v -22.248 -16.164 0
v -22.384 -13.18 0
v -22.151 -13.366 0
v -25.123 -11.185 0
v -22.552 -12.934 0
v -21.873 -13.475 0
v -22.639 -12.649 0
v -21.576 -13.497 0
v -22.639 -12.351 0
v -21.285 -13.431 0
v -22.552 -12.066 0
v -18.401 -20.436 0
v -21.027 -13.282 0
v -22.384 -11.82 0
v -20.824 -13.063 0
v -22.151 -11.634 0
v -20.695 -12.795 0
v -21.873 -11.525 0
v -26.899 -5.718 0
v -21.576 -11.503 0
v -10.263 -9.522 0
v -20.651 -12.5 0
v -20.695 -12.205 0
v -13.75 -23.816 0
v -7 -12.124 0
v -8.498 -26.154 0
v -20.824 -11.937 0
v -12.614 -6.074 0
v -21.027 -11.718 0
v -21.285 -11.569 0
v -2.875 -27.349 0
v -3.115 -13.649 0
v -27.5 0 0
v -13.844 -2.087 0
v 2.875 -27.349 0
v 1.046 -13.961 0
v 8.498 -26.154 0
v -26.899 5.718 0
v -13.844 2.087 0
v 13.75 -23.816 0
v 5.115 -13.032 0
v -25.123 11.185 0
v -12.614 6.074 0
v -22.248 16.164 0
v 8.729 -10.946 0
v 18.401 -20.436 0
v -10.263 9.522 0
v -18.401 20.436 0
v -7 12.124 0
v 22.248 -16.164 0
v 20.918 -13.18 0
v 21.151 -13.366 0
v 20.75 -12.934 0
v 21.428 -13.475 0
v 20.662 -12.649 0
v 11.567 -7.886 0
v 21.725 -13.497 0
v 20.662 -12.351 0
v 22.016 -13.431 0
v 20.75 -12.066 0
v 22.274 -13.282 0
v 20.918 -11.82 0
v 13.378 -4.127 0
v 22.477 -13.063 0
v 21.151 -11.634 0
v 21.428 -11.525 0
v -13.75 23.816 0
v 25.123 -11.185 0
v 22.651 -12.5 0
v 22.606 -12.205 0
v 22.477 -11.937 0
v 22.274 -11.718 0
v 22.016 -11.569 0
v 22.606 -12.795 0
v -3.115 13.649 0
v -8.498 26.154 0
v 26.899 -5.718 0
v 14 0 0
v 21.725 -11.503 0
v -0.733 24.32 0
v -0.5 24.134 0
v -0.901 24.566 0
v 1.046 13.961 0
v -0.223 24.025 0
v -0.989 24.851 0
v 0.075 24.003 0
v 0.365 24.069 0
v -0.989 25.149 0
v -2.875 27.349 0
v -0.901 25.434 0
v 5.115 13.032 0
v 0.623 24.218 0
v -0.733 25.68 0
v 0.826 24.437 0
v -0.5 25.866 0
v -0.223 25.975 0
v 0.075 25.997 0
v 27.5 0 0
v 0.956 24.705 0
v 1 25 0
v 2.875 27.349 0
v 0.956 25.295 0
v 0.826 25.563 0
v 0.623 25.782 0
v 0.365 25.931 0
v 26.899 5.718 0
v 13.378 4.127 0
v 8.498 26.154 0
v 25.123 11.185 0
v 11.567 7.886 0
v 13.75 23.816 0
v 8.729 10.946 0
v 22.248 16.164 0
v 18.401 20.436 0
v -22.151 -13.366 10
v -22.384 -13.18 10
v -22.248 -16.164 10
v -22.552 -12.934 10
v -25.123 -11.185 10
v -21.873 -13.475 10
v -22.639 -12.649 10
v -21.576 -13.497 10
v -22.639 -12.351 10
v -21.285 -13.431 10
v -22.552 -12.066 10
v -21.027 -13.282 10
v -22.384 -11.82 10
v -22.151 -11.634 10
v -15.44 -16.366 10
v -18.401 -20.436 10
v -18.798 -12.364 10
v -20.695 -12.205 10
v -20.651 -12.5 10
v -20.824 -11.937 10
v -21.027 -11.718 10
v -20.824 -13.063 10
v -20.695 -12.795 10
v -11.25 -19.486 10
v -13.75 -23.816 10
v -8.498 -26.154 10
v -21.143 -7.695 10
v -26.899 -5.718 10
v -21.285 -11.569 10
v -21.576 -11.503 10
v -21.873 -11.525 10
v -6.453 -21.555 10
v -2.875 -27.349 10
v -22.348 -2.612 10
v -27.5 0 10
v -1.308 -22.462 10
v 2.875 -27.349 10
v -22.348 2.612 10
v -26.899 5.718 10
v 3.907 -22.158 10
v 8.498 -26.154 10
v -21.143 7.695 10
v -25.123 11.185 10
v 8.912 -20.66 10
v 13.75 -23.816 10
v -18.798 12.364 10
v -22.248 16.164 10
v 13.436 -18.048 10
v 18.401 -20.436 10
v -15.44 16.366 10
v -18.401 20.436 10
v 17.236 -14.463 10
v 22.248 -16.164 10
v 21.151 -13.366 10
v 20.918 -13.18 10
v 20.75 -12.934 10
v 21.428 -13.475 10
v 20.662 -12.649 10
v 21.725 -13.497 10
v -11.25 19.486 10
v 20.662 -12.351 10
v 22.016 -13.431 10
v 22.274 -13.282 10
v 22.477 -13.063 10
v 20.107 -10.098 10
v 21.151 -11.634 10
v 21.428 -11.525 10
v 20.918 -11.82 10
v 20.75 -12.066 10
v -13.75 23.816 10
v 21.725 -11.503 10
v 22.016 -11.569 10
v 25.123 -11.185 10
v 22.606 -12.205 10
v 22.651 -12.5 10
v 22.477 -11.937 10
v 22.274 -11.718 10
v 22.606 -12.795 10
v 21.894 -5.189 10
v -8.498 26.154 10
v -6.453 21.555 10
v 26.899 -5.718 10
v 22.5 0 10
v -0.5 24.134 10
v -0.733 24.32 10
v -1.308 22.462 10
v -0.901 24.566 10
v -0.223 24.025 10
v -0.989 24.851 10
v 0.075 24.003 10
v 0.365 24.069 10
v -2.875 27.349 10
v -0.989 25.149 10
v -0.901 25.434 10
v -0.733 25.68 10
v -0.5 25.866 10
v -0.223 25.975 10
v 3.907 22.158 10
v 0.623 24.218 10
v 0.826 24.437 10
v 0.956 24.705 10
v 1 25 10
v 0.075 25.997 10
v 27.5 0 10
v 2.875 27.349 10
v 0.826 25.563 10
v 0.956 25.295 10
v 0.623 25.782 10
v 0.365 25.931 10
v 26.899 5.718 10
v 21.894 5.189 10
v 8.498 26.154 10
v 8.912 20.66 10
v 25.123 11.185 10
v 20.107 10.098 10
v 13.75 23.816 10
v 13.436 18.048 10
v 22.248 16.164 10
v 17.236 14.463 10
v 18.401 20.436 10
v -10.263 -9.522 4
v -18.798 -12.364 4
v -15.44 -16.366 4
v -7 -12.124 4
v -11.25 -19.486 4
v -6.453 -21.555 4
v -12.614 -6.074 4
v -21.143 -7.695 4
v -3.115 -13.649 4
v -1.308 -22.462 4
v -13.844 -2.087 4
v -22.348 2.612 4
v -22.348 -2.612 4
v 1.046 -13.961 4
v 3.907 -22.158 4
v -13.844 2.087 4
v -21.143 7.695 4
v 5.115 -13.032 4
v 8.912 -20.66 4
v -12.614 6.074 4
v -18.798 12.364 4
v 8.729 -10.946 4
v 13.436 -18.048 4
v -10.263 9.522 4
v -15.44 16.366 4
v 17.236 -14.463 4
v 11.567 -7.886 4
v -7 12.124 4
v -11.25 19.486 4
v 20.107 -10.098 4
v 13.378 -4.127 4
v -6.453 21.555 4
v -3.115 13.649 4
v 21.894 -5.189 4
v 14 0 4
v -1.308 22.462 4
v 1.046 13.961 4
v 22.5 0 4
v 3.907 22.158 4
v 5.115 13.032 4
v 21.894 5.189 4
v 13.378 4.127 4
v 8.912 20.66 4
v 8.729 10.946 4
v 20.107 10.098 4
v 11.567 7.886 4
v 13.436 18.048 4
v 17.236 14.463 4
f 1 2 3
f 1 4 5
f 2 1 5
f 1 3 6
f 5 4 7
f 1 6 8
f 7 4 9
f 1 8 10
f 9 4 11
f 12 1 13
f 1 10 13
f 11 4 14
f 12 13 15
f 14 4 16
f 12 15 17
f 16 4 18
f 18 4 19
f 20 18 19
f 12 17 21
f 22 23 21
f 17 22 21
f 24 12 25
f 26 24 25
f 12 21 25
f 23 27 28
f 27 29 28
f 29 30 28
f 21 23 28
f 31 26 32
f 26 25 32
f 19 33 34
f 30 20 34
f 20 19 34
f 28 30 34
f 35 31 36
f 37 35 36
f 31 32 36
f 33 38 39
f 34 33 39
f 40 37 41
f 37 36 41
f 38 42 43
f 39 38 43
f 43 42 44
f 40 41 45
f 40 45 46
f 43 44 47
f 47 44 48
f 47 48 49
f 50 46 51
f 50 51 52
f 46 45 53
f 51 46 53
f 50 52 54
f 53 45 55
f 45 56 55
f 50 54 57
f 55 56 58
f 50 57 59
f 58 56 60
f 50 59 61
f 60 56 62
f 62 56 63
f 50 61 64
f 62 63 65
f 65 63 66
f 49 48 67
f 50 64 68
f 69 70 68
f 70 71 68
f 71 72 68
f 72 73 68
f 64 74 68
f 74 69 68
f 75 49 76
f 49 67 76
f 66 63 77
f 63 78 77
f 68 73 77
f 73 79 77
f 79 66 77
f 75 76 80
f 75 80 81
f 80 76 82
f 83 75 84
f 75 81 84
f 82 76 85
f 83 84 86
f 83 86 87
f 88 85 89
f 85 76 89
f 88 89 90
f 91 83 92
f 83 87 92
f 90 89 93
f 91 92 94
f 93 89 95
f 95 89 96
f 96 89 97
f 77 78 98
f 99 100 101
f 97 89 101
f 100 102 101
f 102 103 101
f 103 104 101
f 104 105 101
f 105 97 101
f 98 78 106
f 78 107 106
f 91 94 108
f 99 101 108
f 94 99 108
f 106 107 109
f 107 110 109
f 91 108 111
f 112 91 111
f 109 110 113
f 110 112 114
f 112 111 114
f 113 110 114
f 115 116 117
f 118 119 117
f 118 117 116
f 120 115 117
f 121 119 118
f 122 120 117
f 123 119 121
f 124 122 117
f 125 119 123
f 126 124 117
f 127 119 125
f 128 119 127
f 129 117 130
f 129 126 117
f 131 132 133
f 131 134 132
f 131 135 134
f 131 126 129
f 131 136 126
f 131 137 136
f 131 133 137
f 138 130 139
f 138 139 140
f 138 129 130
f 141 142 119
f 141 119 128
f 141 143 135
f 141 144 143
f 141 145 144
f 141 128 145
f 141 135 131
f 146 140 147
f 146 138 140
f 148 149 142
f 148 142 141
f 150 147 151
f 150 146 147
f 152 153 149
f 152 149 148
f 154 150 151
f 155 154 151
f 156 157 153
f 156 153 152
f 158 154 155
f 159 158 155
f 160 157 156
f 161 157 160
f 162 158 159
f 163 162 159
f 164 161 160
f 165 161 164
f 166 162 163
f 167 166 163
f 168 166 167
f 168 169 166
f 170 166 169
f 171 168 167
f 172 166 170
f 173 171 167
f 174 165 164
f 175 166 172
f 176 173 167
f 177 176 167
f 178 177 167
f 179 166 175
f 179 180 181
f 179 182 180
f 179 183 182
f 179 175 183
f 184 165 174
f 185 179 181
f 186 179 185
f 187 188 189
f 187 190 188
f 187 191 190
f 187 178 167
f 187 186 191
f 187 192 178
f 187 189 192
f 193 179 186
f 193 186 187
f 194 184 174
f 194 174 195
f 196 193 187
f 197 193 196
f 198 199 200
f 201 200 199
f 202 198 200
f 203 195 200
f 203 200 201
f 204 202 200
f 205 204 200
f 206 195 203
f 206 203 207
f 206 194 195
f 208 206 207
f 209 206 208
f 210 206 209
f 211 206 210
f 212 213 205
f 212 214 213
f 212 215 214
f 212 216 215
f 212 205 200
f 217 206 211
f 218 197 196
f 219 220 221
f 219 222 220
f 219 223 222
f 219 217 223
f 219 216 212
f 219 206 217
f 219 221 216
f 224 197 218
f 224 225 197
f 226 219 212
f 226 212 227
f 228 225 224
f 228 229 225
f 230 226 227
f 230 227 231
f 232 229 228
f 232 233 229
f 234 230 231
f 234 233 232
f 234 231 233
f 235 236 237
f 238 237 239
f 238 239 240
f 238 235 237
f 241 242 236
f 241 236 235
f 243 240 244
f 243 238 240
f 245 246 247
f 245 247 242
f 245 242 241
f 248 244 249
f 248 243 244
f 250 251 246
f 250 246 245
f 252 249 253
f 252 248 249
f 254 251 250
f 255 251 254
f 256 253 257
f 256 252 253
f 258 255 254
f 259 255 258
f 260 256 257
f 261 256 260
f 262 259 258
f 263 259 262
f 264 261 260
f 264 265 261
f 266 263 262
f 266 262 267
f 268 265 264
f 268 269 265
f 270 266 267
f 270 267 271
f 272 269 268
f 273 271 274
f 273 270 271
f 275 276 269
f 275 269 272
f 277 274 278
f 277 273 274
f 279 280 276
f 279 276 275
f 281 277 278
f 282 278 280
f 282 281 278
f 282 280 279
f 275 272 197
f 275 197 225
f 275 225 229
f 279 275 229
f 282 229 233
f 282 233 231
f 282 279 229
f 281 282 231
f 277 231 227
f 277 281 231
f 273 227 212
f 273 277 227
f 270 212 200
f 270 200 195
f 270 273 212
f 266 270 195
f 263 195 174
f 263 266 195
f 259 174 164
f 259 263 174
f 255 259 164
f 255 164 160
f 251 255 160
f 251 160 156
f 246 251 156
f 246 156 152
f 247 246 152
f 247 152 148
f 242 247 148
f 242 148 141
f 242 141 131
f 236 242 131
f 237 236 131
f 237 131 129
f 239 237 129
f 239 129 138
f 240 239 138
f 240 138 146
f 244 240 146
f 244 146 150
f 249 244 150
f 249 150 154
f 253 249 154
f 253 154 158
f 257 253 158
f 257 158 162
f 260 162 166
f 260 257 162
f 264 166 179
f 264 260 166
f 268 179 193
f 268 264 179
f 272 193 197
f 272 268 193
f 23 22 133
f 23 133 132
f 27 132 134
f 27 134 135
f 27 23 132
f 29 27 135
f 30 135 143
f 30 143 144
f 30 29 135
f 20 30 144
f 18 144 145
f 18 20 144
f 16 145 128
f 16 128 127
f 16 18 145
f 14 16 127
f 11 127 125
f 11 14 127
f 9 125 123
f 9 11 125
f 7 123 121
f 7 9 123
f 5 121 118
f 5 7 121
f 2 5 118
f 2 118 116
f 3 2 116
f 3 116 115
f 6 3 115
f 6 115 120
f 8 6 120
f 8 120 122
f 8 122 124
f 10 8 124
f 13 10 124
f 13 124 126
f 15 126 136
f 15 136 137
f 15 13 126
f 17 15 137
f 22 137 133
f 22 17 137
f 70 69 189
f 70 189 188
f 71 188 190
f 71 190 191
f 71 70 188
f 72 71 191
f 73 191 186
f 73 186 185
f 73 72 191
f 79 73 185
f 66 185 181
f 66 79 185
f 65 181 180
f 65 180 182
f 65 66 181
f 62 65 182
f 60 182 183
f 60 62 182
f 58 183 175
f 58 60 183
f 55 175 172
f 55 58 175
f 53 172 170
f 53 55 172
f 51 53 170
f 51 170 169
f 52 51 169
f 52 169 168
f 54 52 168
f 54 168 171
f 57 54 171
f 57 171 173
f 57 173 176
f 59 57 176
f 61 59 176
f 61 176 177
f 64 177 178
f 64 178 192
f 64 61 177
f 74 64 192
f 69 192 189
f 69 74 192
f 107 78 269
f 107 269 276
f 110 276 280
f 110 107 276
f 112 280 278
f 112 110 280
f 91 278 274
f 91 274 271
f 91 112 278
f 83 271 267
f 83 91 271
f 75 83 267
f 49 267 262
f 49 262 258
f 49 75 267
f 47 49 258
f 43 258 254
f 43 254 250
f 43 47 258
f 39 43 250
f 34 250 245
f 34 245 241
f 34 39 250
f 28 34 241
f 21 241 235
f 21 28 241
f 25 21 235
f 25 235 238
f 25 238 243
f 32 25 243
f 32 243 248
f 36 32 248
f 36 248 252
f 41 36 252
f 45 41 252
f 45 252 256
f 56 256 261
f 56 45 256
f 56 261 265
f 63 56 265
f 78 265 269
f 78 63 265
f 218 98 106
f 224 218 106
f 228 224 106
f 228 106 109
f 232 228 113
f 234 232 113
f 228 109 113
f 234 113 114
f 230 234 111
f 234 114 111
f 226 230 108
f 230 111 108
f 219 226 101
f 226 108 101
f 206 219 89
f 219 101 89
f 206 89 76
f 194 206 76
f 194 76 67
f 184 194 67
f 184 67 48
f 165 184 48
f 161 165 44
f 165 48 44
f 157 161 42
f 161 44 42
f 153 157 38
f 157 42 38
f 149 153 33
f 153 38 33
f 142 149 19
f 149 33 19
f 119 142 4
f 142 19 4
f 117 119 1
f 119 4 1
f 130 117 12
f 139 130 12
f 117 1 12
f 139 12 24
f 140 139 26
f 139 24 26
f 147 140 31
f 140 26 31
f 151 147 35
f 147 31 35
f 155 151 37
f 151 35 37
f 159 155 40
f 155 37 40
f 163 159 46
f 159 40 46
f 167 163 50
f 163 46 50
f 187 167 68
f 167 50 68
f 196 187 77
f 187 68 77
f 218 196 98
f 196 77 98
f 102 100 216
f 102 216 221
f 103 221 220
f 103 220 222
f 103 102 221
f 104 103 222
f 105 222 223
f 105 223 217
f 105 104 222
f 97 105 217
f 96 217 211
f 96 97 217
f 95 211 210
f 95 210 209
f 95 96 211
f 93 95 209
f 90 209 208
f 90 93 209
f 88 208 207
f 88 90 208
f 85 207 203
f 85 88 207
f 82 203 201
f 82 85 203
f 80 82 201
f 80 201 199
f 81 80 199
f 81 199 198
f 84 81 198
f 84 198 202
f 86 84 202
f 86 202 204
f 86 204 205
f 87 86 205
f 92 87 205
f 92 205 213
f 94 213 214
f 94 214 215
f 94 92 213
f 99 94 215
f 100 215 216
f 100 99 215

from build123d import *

# Parameters (mm, degrees)
SKETCH_R      = 27.5
SKETCH_R_2    = 22.5
SKETCH_R_3    = 1
PAD_DEPTH     = 10
SKETCH001_R   = 22.5
SKETCH001_R_2 = 14
PAD001_DEPTH  = 4


with BuildPart() as part:
    # Sketch → Pad (new body)
    with BuildSketch(Plane.XY):
        Circle(SKETCH_R)
        Circle(SKETCH_R_2, mode=Mode.SUBTRACT)
        with Locations((0, 25)):
            Circle(SKETCH_R_3, mode=Mode.SUBTRACT)
        with Locations((-21.650635, -12.5)):
            Circle(SKETCH_R_3, mode=Mode.SUBTRACT)
        with Locations((21.650635, -12.5)):
            Circle(SKETCH_R_3, mode=Mode.SUBTRACT)
    extrude(amount=PAD_DEPTH)

    # Sketch001 → Pad001 (join)
    with BuildSketch(Plane.XY):
        Circle(SKETCH001_R)
        Circle(SKETCH001_R_2, mode=Mode.SUBTRACT)
    extrude(amount=PAD001_DEPTH)


solid = part.part
